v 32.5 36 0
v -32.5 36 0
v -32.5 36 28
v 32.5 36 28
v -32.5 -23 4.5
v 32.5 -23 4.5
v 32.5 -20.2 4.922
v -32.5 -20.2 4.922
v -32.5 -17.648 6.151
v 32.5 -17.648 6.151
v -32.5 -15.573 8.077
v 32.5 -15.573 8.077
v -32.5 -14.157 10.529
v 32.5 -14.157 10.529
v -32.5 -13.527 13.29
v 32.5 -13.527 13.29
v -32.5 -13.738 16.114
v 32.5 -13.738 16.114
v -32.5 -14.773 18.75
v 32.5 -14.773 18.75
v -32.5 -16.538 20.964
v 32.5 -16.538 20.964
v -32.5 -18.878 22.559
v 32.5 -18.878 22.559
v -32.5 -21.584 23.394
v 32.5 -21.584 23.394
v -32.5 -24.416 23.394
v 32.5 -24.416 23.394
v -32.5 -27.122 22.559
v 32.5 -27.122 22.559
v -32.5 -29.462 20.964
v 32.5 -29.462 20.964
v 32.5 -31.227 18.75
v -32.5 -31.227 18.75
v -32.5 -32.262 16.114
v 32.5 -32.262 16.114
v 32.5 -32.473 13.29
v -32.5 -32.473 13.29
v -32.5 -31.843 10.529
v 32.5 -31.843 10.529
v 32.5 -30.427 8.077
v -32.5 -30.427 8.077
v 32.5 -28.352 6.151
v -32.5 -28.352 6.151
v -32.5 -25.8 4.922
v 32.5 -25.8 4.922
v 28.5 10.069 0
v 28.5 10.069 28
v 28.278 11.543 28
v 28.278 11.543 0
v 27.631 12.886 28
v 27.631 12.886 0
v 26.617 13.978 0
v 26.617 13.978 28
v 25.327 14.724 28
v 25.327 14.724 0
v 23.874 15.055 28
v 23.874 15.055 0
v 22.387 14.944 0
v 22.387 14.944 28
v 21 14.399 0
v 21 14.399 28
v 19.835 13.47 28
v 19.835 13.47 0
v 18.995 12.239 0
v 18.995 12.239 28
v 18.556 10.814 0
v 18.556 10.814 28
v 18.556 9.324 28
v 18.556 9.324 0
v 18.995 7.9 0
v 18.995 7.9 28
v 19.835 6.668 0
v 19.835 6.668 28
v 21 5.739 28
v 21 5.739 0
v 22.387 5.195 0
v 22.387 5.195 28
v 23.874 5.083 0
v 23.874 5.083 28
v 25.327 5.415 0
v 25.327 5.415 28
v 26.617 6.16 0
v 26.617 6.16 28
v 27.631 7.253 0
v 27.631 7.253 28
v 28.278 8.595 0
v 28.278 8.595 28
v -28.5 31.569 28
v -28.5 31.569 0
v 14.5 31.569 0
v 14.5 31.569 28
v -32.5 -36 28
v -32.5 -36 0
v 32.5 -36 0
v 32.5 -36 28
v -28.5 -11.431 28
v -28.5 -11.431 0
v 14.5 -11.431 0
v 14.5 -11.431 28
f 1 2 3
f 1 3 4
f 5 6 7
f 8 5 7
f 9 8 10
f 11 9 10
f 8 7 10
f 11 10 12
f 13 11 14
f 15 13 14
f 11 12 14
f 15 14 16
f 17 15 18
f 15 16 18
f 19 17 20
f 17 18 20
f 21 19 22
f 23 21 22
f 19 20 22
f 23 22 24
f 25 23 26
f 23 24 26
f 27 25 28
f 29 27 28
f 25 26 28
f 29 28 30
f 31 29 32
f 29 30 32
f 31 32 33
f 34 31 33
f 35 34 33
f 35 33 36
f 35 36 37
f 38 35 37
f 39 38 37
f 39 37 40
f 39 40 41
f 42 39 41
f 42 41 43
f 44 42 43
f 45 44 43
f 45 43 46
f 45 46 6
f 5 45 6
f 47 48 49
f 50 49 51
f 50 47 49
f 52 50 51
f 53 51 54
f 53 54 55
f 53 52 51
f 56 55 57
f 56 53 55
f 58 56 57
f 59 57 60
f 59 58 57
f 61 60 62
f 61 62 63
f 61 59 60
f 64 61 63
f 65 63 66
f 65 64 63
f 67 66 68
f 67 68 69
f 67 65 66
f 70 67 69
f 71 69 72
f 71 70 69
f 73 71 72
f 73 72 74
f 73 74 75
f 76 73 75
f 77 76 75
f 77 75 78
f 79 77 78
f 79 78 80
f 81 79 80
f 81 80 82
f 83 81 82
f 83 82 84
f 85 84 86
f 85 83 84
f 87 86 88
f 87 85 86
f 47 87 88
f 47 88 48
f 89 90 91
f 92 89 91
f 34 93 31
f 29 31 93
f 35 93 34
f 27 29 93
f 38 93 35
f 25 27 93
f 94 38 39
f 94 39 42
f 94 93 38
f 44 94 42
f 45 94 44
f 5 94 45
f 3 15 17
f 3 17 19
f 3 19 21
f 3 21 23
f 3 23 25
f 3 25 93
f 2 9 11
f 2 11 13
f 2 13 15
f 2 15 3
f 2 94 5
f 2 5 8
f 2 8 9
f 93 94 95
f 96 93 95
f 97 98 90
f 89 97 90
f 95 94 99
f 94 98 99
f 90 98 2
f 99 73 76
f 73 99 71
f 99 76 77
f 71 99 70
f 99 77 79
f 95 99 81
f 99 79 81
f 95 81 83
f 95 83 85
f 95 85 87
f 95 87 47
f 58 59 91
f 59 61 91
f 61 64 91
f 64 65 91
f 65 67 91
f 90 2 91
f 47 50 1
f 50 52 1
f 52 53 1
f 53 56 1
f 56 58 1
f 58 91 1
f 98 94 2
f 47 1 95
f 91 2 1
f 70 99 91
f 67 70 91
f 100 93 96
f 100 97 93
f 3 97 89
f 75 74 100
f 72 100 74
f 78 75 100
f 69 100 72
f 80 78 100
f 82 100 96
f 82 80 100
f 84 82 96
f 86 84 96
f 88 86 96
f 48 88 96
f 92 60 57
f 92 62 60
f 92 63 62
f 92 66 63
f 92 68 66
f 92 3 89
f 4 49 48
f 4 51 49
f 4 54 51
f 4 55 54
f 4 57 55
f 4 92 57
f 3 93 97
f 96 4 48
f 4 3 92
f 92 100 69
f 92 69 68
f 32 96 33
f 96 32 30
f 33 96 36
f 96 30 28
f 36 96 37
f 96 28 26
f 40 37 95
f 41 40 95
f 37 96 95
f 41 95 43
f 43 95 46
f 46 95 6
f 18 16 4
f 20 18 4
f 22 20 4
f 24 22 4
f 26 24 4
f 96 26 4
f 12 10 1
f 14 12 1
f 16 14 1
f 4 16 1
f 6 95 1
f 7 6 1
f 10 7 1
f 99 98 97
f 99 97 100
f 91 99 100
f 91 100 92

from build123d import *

# Parameters (mm, degrees)
SKETCH1_W           = 65
SKETCH1_H           = 72
SKETCH1_R           = 5
SKETCH1_W_2         = 43
SKETCH1_H_2         = 43
BOSS_EXTRUDE1_DEPTH = 28
SKETCH2_R           = 9.5
CUT_EXTRUDE1_DEPTH  = 80.404030124


with BuildPart() as part:
    # Sketch1 → Boss-Extrude1 (new body)
    with BuildSketch(Plane.XY):
        Rectangle(SKETCH1_W, SKETCH1_H)
        with Locations((23.5, 10.069230769)):
            Circle(SKETCH1_R, mode=Mode.SUBTRACT)
        with Locations((-7, 10.069230769)):
            Rectangle(SKETCH1_W_2, SKETCH1_H_2, mode=Mode.SUBTRACT)
    extrude(amount=BOSS_EXTRUDE1_DEPTH)

    # Sketch2 → Cut-Extrude1 (cut, through all)
    with BuildSketch(Plane(origin=(32.5, 0, 0), x_dir=(0, 0, -1), z_dir=(1, 0, 0))):
        with Locations((-14, -23)):
            Circle(SKETCH2_R)
    extrude(amount=-CUT_EXTRUDE1_DEPTH, mode=Mode.SUBTRACT)


solid = part.part
